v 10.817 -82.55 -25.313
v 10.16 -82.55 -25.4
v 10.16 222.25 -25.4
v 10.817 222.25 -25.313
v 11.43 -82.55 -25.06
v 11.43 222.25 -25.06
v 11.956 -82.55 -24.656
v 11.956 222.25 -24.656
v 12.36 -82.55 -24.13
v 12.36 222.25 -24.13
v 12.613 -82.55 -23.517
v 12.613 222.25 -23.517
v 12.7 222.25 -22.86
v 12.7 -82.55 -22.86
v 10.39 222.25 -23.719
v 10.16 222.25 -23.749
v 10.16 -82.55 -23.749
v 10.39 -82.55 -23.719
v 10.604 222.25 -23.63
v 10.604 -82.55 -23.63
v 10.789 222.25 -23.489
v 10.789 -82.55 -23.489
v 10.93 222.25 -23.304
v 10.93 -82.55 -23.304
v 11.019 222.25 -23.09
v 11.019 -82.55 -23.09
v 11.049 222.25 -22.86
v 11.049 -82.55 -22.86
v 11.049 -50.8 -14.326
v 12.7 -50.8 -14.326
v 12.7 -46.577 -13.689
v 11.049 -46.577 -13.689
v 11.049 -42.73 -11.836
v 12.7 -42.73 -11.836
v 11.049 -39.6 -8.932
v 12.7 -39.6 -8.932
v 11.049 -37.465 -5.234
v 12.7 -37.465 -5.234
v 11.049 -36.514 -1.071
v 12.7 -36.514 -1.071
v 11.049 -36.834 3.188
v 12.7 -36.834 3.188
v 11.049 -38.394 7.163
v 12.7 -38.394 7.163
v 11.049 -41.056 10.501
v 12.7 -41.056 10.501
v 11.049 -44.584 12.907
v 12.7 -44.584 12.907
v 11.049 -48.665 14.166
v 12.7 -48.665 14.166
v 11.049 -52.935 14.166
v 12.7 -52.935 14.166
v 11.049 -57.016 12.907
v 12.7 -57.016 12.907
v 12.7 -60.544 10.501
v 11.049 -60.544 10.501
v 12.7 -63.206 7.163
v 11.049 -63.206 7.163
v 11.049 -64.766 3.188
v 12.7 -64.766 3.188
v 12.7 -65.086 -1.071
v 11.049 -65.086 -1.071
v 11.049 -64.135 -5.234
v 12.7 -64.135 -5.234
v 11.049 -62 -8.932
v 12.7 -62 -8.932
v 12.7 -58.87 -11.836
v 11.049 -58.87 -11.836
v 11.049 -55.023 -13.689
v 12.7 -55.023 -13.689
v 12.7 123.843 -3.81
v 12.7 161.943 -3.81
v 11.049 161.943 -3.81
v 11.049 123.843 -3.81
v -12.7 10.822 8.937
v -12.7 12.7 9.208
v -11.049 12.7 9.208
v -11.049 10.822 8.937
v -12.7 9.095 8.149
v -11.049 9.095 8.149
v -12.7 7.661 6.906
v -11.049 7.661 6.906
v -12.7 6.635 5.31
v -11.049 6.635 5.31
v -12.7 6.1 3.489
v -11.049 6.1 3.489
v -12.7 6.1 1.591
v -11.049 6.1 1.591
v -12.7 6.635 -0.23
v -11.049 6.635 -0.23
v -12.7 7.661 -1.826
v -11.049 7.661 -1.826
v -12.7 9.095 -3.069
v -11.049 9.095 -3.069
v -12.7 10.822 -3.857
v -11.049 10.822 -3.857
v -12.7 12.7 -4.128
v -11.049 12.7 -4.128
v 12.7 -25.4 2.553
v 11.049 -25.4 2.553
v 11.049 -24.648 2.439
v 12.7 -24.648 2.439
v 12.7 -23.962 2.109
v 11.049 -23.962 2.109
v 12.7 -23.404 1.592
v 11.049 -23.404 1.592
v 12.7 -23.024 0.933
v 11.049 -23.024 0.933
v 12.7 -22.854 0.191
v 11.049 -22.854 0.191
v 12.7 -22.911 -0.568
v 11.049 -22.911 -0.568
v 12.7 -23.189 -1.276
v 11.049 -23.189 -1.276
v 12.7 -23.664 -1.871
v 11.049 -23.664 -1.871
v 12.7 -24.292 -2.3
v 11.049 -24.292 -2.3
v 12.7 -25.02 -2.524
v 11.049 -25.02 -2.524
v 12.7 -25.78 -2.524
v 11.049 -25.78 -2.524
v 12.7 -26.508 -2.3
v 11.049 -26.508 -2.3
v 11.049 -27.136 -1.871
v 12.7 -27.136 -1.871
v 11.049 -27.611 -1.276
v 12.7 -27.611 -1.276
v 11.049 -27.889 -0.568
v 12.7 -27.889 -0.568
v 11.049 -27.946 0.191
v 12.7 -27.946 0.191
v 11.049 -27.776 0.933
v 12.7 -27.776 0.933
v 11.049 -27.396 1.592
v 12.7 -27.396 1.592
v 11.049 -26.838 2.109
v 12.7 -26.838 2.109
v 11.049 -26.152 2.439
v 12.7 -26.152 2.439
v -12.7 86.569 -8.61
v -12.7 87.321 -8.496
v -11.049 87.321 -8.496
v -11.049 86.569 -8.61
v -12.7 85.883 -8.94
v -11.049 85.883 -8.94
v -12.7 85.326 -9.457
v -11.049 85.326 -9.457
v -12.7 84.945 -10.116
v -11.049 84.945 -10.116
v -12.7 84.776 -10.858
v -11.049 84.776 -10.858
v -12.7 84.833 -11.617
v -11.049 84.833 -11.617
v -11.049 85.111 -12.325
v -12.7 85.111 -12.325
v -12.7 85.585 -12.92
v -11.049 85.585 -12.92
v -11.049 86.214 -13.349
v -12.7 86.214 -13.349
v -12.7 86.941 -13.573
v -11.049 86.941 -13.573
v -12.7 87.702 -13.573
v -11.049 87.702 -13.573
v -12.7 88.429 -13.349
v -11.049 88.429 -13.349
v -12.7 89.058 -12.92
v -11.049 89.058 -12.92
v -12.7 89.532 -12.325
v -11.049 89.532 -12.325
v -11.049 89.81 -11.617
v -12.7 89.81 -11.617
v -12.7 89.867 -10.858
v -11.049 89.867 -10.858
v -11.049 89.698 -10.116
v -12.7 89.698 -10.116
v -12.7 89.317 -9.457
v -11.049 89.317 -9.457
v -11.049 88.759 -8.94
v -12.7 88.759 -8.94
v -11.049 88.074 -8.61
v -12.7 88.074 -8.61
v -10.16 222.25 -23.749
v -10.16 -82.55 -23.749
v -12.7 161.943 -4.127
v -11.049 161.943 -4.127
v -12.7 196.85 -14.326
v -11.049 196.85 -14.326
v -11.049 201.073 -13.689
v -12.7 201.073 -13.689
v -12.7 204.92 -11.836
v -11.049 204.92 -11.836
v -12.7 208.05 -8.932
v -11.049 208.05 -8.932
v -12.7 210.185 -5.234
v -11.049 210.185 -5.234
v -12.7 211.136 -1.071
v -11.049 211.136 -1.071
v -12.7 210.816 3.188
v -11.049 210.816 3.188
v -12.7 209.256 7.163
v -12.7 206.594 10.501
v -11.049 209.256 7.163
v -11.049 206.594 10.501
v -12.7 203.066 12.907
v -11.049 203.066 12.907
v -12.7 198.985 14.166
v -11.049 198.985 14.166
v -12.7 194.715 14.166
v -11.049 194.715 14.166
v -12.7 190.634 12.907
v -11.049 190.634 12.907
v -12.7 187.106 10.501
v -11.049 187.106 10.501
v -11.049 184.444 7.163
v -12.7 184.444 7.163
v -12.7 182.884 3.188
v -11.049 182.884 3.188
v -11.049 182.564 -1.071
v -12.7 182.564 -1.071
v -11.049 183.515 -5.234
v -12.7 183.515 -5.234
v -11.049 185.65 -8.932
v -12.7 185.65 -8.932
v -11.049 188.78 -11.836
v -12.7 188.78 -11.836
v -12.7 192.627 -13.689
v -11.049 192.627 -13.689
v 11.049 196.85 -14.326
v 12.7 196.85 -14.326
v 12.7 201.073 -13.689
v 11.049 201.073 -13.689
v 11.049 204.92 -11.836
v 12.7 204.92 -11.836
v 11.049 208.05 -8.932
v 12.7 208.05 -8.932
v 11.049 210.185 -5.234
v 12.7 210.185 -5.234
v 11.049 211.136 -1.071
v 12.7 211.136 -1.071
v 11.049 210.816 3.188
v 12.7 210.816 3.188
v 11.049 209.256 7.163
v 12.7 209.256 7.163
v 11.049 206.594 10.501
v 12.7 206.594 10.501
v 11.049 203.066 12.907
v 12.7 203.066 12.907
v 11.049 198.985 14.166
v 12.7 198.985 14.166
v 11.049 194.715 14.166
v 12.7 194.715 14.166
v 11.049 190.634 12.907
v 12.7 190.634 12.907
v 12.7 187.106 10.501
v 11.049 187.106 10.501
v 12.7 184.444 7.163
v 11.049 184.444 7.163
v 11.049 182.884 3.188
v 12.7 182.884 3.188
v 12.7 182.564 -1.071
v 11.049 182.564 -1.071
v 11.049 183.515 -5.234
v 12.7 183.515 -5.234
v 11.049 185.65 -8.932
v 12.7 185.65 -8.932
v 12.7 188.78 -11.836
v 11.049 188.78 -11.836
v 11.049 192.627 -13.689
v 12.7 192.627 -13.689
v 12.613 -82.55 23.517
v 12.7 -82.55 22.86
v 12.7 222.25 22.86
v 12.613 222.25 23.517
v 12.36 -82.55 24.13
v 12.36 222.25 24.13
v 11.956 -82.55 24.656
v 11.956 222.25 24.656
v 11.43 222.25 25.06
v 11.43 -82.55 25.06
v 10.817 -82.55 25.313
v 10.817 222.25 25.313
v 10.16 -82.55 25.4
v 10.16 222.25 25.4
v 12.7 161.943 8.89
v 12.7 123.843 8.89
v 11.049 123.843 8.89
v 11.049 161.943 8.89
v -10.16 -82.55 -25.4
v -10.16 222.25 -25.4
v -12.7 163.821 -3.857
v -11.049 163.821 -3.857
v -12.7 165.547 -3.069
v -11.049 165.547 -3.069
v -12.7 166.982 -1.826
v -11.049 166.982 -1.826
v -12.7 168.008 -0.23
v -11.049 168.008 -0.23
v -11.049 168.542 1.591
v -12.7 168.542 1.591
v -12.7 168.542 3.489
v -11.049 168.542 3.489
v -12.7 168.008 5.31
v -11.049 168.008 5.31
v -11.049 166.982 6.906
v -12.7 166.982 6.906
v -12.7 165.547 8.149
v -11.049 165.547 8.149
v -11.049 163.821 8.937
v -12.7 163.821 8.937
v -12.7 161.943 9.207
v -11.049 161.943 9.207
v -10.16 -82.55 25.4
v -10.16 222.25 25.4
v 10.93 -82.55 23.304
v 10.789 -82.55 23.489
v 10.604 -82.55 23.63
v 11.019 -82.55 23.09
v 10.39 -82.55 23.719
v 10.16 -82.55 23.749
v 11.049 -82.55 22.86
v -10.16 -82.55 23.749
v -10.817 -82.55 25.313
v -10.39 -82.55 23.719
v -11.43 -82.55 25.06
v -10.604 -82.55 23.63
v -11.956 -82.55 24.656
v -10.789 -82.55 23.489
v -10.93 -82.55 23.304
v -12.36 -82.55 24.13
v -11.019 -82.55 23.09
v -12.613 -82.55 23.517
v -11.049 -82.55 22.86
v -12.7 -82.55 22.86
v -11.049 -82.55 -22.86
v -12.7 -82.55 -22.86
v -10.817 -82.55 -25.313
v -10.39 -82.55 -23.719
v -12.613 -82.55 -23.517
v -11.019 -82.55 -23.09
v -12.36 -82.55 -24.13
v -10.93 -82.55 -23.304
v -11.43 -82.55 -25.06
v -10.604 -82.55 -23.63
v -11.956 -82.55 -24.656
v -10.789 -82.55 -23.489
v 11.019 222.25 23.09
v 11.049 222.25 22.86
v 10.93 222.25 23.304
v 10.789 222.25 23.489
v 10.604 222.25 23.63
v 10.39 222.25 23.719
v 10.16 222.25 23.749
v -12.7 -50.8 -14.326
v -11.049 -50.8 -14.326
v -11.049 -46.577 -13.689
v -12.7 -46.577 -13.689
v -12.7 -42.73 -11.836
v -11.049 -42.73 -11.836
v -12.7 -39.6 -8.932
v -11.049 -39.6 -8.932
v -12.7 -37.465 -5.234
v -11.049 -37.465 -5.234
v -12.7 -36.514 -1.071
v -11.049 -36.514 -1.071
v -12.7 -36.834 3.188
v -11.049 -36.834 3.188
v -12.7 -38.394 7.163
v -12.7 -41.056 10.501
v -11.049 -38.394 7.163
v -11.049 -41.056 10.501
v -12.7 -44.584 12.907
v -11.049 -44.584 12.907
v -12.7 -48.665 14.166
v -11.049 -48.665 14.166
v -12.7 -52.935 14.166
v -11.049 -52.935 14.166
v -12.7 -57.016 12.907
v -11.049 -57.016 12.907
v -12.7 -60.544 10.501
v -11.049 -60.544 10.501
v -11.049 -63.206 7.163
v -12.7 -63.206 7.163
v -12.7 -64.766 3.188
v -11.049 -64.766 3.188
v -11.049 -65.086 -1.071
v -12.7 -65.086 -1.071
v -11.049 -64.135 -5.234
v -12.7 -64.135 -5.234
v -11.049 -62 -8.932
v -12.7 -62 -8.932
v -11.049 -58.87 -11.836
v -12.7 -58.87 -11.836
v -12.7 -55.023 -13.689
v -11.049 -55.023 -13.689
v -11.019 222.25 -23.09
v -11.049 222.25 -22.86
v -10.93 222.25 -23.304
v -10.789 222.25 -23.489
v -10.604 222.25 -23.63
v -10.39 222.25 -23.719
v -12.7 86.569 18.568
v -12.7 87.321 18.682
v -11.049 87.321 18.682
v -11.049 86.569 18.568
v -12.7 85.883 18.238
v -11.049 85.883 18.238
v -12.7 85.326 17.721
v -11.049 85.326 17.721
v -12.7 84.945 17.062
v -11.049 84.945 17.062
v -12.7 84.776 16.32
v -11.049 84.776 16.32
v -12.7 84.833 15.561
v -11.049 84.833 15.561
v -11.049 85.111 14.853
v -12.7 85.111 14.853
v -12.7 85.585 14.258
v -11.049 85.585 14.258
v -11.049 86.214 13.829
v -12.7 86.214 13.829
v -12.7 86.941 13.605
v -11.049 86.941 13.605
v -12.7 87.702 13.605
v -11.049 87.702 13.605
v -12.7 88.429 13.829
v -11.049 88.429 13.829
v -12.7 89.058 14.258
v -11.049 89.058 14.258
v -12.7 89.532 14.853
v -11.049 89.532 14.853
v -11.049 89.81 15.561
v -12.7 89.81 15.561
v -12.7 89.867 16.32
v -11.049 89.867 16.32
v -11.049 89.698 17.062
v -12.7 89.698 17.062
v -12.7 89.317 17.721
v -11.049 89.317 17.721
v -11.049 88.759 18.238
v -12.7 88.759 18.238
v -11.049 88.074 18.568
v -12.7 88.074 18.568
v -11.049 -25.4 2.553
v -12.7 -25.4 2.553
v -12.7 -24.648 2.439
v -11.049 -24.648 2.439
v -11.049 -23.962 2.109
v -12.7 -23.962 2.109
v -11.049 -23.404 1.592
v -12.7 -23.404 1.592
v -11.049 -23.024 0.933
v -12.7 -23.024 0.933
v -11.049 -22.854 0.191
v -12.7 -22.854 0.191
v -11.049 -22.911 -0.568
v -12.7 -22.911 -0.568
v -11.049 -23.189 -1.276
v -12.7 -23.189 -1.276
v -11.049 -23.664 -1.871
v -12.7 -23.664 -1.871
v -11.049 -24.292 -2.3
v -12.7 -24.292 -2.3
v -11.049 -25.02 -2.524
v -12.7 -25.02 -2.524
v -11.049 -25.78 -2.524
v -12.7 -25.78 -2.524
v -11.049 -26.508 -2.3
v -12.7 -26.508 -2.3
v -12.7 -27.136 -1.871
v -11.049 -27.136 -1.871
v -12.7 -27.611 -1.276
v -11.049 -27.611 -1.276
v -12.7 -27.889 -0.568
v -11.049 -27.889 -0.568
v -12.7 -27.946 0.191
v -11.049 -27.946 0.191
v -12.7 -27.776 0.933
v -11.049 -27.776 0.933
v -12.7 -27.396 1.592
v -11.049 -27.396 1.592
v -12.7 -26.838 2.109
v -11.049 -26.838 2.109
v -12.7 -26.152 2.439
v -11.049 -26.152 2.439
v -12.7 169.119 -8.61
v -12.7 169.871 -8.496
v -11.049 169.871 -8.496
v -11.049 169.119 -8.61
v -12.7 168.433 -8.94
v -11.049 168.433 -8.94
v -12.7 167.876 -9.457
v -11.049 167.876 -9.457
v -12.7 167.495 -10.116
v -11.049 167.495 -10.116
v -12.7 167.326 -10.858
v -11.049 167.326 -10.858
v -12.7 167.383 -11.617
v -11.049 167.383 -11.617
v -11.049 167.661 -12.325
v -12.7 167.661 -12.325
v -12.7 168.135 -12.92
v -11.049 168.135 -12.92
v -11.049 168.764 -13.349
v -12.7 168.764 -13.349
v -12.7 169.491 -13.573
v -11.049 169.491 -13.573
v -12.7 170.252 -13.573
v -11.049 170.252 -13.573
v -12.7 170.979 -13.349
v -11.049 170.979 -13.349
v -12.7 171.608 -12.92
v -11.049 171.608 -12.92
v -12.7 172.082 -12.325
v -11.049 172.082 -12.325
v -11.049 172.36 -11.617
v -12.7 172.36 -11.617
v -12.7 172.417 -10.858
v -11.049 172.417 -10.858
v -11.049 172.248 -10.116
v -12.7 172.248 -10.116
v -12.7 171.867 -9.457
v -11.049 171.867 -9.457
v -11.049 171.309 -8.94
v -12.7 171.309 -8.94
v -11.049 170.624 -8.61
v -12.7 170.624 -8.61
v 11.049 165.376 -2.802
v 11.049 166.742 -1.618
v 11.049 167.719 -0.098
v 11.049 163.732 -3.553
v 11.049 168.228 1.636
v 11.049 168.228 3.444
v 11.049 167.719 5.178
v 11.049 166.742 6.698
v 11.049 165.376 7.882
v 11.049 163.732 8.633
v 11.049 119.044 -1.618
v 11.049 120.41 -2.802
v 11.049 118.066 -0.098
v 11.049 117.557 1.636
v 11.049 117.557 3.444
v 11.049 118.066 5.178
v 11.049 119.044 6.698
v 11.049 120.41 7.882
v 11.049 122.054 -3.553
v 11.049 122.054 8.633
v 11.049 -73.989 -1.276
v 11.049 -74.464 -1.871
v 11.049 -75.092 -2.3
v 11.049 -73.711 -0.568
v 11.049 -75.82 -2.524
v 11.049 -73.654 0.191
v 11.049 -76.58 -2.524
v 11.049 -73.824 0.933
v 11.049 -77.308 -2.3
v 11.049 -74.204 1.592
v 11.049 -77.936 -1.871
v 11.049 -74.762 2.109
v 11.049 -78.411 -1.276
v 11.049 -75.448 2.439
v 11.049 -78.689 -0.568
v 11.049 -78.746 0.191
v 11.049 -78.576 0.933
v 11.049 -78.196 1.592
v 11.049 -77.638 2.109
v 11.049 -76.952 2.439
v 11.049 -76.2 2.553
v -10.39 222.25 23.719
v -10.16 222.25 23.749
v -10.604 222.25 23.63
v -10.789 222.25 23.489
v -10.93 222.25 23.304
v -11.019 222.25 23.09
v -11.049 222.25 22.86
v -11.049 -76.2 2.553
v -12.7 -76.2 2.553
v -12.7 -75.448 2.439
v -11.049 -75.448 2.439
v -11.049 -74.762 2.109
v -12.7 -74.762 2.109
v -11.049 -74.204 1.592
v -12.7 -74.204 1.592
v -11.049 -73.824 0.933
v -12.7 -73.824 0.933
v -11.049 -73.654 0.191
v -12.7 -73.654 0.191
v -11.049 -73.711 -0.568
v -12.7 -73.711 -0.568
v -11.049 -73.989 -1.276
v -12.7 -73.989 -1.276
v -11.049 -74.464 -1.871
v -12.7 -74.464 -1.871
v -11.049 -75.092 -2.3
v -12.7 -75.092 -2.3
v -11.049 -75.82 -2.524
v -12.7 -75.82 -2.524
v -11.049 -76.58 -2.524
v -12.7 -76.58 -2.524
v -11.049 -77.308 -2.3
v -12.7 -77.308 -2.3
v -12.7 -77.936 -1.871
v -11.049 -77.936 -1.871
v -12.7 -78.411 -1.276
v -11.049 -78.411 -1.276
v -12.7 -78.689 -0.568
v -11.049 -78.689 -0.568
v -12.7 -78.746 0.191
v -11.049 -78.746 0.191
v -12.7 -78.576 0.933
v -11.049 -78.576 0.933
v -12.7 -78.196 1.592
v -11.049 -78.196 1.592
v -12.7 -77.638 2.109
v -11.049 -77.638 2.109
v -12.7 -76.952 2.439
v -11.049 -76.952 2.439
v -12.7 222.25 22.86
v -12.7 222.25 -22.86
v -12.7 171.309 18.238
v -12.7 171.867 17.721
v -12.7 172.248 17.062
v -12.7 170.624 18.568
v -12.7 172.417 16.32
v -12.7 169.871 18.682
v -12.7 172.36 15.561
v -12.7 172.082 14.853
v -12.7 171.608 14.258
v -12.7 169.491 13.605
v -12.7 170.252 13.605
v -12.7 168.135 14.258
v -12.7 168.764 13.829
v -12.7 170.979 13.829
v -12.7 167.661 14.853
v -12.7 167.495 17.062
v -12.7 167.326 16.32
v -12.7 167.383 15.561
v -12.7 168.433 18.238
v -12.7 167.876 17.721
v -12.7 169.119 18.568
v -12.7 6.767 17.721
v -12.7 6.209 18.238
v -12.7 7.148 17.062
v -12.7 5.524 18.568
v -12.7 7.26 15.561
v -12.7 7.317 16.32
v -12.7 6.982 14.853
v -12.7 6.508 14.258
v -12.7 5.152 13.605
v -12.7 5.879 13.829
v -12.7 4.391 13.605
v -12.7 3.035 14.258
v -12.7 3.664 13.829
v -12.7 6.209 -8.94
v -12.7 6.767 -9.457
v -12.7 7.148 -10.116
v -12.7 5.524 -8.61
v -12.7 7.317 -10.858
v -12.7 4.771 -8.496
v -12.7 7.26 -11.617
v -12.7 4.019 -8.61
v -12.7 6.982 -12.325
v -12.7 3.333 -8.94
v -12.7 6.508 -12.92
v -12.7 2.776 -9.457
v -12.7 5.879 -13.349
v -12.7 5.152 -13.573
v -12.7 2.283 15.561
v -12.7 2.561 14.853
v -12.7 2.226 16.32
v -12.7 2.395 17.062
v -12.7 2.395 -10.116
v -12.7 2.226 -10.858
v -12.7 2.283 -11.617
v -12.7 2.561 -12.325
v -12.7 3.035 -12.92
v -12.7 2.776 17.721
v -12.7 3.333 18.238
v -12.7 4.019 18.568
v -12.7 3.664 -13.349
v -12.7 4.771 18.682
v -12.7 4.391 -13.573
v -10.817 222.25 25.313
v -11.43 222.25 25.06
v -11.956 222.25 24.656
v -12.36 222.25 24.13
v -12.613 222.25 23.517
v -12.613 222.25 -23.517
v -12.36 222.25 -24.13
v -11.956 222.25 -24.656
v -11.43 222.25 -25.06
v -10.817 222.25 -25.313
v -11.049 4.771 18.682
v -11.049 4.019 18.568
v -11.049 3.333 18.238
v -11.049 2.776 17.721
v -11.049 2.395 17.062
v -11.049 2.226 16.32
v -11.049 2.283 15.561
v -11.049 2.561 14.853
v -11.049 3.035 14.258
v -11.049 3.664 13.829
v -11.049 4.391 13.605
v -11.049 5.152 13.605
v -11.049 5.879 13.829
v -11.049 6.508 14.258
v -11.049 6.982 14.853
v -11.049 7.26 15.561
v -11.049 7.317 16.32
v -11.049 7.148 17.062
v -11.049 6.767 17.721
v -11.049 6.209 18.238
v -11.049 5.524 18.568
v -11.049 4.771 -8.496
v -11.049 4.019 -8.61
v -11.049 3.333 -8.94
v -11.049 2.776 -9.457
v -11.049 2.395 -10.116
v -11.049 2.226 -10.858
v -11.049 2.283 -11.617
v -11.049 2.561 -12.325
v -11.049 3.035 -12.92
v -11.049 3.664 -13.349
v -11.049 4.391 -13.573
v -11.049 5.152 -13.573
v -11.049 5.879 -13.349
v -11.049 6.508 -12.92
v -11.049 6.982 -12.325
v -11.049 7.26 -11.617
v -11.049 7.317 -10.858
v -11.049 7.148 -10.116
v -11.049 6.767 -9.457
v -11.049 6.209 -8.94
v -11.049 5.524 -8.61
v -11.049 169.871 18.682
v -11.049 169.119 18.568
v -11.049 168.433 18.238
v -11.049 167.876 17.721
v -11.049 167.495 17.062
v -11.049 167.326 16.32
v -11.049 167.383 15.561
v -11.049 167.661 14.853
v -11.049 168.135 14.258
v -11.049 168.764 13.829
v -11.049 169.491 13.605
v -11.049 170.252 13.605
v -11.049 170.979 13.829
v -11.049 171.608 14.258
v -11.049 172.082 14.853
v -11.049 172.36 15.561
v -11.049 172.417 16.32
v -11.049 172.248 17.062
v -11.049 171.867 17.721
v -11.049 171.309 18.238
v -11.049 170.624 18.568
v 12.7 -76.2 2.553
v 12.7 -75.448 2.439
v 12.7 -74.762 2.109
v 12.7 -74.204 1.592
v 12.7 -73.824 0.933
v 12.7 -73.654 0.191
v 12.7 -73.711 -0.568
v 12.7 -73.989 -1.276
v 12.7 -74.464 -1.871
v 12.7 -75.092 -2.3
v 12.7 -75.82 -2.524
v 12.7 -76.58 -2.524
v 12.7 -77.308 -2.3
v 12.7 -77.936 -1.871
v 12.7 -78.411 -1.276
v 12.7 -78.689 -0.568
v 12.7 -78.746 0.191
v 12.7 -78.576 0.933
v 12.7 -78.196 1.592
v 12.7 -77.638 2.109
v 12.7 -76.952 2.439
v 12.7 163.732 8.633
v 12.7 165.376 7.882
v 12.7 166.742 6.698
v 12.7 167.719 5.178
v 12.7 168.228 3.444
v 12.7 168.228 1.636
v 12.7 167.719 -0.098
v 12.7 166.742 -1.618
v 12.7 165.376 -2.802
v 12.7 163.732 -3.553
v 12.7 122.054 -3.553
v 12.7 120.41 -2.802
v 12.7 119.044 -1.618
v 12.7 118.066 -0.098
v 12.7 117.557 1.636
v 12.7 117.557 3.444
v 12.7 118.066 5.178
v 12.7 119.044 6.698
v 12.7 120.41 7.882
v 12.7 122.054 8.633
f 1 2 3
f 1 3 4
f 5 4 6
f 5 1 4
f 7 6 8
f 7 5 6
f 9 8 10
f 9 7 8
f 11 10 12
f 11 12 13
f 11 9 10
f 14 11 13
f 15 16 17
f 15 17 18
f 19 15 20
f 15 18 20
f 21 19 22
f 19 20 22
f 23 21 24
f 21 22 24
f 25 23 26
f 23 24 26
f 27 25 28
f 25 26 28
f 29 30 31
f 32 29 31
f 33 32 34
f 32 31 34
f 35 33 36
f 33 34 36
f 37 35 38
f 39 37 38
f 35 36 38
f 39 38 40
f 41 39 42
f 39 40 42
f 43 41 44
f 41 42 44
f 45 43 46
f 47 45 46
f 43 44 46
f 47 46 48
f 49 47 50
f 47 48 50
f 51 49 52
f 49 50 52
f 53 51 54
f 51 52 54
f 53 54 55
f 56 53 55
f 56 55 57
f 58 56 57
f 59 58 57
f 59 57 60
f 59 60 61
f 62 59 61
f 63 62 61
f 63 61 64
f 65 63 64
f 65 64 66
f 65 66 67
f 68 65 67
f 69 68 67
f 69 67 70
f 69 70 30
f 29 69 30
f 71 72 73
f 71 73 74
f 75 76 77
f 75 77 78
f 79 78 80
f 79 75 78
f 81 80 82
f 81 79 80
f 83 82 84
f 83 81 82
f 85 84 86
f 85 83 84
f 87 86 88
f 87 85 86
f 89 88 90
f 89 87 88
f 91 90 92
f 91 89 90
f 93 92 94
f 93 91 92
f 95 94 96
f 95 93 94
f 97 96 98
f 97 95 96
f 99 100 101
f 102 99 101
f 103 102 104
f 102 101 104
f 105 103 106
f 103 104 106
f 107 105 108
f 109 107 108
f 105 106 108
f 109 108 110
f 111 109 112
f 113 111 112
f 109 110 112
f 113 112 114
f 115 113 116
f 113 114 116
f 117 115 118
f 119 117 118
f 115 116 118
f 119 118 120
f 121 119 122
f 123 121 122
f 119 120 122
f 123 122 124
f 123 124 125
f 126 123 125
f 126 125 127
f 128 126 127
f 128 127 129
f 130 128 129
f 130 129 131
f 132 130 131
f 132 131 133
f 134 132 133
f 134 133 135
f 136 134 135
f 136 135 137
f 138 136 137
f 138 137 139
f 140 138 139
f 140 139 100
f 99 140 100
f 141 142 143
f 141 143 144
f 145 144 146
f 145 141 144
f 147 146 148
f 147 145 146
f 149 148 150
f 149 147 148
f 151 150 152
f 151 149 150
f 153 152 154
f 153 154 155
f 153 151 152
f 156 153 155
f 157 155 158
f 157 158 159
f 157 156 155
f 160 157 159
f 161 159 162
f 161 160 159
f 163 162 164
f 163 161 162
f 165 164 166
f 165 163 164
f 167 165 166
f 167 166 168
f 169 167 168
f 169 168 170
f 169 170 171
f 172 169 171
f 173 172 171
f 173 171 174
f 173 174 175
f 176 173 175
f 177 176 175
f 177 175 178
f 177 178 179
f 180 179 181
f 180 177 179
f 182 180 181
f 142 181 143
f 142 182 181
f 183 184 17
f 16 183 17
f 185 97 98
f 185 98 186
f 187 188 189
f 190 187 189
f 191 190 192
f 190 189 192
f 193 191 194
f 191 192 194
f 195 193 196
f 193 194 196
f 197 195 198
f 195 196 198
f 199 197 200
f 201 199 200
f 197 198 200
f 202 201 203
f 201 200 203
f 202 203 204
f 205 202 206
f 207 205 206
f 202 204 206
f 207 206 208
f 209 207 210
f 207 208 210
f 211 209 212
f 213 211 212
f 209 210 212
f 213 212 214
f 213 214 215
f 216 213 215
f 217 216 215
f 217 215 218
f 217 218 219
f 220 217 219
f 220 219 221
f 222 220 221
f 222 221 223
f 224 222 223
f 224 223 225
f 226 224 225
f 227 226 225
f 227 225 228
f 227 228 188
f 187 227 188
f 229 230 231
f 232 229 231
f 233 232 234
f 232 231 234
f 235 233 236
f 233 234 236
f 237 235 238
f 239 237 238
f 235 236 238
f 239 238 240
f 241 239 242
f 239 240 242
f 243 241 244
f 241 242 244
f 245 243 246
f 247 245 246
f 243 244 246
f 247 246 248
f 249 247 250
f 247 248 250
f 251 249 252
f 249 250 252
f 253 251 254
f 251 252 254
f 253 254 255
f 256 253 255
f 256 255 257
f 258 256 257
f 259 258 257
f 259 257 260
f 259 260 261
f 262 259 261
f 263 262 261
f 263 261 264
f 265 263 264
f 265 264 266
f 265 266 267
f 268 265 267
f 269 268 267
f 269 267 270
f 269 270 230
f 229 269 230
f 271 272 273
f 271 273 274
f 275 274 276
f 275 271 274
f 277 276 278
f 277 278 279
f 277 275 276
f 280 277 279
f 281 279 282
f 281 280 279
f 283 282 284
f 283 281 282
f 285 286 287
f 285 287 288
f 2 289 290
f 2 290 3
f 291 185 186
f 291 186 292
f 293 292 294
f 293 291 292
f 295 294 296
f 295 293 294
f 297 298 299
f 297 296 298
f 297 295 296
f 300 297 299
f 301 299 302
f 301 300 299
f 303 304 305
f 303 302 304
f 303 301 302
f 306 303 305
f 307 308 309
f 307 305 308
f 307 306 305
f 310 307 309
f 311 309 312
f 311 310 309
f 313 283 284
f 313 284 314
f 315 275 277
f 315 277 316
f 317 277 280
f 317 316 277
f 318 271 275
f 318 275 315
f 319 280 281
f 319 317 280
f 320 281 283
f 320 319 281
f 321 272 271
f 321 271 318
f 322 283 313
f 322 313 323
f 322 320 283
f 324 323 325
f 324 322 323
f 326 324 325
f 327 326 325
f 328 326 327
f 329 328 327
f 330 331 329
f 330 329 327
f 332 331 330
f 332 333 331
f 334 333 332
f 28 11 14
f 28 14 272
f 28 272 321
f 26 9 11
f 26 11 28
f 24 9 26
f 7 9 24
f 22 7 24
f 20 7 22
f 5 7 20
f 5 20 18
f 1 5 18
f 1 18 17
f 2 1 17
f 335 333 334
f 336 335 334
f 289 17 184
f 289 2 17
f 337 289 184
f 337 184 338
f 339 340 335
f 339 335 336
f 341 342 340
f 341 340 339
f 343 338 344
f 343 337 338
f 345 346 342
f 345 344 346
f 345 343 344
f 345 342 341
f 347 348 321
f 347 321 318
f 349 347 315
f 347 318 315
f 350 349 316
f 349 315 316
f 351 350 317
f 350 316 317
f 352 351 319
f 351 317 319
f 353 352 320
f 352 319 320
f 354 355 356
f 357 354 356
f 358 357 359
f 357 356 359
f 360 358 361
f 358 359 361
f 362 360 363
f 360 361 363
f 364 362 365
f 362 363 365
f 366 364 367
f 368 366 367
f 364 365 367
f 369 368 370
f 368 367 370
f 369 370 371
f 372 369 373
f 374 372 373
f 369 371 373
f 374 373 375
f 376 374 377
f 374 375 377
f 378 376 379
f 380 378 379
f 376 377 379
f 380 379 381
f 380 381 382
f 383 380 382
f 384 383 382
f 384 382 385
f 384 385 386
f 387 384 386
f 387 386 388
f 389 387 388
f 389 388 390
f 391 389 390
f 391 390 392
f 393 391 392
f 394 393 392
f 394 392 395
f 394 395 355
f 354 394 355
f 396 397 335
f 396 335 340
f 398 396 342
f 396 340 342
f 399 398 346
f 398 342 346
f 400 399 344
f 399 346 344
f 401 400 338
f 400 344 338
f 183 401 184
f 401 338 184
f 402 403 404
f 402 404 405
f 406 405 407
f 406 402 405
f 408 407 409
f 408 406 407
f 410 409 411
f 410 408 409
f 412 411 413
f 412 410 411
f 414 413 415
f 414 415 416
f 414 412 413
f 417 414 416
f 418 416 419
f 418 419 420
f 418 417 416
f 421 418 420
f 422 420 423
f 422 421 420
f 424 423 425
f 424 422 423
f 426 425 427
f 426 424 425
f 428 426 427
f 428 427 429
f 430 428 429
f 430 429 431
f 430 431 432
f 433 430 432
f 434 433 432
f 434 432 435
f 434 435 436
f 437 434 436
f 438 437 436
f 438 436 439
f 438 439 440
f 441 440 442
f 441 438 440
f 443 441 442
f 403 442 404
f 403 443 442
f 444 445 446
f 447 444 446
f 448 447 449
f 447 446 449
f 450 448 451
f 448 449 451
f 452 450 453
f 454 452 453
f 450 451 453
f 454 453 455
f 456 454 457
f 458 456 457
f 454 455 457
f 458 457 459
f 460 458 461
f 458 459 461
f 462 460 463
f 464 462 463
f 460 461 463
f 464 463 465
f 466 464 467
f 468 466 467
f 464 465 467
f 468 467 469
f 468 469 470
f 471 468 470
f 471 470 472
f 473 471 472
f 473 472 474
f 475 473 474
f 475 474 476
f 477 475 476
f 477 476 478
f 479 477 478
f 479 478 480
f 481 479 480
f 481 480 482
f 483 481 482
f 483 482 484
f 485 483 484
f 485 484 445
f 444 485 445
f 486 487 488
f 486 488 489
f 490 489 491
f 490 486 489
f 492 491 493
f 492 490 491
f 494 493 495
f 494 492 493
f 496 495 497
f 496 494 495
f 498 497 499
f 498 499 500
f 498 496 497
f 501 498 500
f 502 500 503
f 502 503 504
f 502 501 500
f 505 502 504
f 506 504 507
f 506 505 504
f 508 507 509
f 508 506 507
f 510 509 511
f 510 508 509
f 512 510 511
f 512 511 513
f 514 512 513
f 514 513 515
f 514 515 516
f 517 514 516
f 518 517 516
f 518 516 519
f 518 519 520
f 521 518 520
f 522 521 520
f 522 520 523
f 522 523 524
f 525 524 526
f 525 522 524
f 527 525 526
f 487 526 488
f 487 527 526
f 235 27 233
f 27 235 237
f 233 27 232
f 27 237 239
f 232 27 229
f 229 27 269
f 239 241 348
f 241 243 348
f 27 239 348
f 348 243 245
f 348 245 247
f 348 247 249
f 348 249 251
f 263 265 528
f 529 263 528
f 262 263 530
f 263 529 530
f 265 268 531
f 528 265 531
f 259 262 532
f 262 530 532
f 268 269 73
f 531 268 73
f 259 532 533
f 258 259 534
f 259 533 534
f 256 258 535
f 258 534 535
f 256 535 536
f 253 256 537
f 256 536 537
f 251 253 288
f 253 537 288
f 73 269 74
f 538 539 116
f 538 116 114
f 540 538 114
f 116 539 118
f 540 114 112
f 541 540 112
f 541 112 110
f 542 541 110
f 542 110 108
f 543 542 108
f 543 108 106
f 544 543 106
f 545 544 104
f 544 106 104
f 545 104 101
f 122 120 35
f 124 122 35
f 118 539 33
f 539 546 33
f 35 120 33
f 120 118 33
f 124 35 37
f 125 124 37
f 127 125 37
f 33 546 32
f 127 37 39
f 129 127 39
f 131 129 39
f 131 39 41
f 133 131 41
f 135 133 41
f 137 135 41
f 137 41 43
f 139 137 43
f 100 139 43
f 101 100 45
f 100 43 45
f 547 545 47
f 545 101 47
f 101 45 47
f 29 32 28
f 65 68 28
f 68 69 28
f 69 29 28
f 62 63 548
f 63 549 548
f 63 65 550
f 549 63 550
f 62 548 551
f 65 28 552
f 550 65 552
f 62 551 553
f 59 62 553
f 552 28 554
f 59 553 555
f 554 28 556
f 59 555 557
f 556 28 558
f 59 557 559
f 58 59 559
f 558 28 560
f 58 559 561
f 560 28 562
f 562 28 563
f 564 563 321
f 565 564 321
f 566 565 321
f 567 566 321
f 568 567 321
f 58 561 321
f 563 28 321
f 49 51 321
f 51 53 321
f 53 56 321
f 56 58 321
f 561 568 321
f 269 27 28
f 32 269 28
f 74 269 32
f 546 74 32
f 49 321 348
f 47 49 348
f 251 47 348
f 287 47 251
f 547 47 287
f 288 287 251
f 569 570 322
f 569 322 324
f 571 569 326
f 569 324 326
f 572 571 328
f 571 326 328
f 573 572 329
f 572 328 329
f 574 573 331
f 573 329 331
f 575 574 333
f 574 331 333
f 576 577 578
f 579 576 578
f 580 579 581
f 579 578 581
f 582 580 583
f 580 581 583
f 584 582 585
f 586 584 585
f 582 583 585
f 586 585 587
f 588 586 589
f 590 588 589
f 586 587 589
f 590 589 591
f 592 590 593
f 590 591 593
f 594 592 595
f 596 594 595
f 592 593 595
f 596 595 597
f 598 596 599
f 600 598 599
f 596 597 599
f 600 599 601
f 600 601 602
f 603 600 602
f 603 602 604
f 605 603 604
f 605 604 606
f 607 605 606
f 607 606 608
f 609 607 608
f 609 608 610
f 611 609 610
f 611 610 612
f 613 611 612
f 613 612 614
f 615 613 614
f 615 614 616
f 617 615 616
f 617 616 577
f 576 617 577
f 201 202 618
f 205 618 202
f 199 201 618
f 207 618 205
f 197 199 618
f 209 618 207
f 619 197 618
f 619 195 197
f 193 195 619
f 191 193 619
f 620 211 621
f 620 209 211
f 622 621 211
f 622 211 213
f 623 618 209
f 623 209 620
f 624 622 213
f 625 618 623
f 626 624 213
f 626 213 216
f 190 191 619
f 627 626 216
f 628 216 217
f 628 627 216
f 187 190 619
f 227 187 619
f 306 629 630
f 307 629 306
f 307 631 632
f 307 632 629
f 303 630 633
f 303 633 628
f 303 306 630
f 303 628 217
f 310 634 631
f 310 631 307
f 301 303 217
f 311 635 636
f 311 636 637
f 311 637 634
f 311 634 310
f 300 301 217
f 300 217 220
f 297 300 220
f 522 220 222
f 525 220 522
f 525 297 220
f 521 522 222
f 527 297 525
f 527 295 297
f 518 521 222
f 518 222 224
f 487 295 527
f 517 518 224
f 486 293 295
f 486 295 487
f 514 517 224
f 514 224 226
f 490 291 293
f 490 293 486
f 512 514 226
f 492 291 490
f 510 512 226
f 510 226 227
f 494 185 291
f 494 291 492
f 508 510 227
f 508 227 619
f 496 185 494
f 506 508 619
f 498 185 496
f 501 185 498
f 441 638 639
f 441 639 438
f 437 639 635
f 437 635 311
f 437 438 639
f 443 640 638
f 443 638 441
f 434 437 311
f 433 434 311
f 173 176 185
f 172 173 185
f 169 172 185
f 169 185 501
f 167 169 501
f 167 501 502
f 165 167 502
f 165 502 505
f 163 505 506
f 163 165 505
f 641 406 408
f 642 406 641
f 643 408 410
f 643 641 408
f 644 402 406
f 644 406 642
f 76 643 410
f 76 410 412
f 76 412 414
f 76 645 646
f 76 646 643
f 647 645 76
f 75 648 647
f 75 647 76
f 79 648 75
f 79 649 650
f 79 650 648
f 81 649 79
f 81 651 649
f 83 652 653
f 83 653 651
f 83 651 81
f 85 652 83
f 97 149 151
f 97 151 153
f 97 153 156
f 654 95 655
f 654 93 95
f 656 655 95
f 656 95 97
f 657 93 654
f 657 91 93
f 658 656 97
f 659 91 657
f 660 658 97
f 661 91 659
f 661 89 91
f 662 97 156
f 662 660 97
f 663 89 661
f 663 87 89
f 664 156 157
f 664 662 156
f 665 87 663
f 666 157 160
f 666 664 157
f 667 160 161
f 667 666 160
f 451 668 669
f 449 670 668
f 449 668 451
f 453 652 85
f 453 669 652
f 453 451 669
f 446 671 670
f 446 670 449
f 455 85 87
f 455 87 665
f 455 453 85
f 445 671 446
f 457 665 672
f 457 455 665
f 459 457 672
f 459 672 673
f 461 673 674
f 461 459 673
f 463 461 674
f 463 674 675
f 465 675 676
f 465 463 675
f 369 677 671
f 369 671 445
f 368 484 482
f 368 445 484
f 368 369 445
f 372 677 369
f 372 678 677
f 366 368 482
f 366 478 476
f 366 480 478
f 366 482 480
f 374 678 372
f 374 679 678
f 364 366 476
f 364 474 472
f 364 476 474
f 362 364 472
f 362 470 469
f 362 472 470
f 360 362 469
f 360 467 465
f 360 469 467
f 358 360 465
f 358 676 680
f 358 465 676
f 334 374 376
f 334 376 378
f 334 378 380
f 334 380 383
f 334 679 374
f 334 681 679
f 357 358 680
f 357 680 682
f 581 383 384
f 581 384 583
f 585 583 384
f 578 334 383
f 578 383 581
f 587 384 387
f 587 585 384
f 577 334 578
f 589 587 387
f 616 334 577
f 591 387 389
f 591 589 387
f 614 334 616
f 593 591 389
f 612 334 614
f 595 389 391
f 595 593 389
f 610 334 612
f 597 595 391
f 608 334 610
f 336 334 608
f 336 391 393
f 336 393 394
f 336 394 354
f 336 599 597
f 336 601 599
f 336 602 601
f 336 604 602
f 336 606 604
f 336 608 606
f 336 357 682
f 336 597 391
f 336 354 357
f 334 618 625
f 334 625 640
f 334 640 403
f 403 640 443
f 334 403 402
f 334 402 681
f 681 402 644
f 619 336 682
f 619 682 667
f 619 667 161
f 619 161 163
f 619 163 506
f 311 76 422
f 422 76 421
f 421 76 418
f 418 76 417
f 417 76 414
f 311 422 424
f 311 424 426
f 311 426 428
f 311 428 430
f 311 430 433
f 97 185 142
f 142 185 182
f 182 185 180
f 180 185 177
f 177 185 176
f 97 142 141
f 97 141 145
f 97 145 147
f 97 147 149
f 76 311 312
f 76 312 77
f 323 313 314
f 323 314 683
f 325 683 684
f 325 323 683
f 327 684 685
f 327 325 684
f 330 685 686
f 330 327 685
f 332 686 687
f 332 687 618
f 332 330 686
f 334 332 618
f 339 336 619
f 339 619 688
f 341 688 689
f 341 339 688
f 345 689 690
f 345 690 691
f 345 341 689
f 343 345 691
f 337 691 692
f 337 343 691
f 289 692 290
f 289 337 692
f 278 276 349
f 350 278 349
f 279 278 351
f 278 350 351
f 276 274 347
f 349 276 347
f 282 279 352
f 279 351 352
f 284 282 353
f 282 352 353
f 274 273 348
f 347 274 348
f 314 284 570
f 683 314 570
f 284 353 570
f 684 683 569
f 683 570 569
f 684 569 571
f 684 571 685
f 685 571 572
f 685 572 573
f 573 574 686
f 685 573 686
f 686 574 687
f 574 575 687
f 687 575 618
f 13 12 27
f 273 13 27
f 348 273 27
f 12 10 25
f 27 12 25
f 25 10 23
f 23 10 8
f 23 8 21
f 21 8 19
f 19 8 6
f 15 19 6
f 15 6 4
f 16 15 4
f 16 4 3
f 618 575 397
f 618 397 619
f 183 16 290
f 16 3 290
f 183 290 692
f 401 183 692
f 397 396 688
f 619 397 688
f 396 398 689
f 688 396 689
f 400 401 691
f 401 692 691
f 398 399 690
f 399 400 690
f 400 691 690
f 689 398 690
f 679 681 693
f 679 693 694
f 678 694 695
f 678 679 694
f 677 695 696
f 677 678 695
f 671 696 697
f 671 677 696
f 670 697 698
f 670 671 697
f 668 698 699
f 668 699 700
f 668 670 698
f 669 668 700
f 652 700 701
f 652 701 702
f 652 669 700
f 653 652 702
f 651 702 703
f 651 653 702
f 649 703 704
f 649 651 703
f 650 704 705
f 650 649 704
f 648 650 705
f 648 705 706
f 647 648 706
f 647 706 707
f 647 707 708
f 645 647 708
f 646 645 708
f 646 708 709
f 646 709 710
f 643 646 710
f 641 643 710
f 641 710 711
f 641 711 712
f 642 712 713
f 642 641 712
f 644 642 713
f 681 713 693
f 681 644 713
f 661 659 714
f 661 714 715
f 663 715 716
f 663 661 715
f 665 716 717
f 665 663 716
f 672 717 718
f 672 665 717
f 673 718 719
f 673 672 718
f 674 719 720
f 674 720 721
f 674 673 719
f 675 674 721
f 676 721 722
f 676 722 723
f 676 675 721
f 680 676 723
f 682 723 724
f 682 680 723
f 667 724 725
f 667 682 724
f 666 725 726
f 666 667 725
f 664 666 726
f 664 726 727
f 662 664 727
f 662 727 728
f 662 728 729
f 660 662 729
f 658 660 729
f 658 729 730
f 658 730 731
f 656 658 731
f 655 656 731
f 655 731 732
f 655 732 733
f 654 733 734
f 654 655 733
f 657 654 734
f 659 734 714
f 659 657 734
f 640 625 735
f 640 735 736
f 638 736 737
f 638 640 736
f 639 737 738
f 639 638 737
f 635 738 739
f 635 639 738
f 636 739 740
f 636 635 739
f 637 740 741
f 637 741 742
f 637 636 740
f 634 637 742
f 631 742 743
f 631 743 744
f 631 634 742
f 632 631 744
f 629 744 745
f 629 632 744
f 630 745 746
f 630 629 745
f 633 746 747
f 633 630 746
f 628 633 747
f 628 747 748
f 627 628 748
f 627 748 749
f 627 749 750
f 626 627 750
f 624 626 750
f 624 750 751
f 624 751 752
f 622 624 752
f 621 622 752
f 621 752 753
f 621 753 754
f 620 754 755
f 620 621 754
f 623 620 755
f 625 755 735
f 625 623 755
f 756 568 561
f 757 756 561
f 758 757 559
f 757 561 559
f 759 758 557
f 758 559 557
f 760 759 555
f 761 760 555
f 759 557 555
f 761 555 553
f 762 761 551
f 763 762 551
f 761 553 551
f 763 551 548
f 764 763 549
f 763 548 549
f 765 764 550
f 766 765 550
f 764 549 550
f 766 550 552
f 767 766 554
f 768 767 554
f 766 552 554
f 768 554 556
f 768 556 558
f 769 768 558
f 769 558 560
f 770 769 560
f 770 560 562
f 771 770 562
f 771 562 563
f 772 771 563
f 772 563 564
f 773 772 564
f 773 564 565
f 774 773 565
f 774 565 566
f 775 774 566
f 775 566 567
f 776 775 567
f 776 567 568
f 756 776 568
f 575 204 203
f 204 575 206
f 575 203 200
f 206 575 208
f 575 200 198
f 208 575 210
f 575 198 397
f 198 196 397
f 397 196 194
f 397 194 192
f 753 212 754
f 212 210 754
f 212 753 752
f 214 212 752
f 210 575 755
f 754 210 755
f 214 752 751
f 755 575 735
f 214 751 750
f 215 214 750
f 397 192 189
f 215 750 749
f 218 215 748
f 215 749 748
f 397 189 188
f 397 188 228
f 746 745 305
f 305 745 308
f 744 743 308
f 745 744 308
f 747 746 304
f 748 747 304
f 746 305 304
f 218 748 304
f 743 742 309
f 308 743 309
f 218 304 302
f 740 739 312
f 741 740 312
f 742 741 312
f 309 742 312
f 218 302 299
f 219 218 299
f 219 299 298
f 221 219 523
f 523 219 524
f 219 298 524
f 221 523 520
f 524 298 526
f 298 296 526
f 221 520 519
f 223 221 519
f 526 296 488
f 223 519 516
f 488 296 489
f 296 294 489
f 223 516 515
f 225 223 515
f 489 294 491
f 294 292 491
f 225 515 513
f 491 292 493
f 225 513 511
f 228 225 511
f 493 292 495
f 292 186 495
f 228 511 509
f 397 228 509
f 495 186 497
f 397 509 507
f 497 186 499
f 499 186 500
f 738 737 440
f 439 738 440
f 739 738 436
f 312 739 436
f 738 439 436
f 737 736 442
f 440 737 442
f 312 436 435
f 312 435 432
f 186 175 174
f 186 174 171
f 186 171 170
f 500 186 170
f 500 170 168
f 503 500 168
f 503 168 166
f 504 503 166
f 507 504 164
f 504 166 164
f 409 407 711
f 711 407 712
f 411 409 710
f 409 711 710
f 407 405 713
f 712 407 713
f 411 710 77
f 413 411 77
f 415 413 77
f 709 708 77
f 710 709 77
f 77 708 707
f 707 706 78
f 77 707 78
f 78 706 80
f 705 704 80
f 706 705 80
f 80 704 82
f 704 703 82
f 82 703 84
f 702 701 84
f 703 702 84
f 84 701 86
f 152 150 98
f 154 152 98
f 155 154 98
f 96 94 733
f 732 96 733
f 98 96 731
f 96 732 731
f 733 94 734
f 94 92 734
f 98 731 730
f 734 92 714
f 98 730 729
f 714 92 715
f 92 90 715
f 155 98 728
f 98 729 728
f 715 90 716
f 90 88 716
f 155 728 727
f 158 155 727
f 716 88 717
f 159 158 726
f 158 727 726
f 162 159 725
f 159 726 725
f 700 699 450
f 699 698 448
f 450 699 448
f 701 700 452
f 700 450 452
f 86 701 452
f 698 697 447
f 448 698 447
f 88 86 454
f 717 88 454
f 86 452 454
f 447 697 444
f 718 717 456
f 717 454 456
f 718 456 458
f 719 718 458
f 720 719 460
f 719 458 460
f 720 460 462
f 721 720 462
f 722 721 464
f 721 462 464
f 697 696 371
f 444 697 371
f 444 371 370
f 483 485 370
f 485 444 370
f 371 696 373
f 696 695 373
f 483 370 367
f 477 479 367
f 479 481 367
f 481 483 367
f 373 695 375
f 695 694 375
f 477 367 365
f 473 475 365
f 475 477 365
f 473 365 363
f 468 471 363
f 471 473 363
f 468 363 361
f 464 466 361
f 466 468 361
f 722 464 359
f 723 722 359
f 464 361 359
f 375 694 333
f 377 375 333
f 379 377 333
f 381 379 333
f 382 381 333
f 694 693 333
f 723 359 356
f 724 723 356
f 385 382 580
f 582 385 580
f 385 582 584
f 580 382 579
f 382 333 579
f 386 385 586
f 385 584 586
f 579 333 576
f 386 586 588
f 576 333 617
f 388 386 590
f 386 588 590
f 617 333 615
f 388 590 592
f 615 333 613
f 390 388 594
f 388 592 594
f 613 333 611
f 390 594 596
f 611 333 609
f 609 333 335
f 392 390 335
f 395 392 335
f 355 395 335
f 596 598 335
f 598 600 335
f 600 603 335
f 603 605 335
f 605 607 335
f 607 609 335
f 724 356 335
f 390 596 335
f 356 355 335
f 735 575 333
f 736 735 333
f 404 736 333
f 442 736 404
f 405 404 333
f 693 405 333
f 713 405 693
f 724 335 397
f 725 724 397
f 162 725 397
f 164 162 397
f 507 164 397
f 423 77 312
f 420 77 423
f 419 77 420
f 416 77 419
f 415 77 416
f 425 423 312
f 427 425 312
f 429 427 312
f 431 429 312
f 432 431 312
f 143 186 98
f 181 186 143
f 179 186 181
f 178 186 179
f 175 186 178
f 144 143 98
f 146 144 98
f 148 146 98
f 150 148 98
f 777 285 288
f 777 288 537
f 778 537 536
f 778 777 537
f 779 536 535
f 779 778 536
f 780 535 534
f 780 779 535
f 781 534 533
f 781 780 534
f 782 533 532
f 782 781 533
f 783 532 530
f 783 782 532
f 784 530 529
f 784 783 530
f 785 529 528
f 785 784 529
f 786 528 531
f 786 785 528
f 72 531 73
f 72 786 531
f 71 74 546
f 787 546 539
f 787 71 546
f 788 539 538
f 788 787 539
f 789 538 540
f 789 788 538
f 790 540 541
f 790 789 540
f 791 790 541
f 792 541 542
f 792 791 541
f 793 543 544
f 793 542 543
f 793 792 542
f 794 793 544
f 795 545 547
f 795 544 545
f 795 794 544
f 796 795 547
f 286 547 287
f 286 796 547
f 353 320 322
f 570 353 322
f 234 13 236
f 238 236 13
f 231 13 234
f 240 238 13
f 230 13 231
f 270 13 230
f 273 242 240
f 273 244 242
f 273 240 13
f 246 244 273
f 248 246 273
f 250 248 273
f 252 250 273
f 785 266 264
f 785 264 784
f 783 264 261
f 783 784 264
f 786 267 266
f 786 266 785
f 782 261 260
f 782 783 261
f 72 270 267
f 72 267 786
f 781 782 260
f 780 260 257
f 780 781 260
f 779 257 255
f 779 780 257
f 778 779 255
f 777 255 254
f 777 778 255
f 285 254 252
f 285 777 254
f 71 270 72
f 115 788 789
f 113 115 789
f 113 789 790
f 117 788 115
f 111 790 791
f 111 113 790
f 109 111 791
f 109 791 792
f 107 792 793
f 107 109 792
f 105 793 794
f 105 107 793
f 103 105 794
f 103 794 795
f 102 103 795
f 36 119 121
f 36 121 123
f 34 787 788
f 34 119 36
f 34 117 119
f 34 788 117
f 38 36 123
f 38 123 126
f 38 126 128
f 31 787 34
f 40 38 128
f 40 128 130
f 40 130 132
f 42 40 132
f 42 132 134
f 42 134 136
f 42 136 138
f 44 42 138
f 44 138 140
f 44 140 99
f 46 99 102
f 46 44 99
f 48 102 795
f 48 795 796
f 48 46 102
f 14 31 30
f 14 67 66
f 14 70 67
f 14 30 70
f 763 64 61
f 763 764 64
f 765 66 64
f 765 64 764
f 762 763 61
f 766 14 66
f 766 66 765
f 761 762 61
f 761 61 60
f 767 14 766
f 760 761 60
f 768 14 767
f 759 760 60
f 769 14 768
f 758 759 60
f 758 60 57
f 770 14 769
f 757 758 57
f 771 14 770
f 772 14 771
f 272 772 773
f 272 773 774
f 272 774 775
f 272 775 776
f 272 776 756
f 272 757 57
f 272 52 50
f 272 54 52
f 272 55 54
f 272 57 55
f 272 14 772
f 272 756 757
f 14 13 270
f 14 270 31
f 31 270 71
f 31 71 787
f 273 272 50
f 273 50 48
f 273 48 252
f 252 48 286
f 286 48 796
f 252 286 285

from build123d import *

# Parameters (mm, degrees)
EXTRUDE_THIN1_DEPTH      = 222.25
EXTRUDE_THIN1_DEPTH_BACK = 82.55
CUT_EXTRUDE1_REACH       = 227.134
CUT_EXTRUDE4_REACH       = 227.134
SKETCH4_R                = 2.5527
CUT_EXTRUDE3_DEPTH       = 1.651
SKETCH6_R                = 14.3256
CUT_EXTRUDE5_DEPTH       = 226.134143346
F_10_CLEARANCE_HOLE1_D   = 5.1054


with BuildPart() as part:
    # Sketch1 → Extrude-Thin1 (new, two sides: drawn at the far end of the back side and taken through both)
    with BuildSketch(Plane(origin=(0, 0, 0), x_dir=(1, 0, 0), z_dir=(0, 1, 0)).offset(-EXTRUDE_THIN1_DEPTH_BACK)):
        with BuildLine():
            Line((-10.16, 25.4), (10.16, 25.4))
            ThreePointArc((10.16, 25.4), (11.956051224, 24.656051224), (12.7, 22.86))
            Line((12.7, 22.86), (12.7, -22.86))
            ThreePointArc((12.7, -22.86), (11.956051224, -24.656051224), (10.16, -25.4))
            Line((10.16, -25.4), (-10.16, -25.4))
            ThreePointArc((-10.16, -25.4), (-11.956051224, -24.656051224), (-12.7, -22.86))
            Line((-12.7, -22.86), (-12.7, 22.86))
            ThreePointArc((-12.7, 22.86), (-11.956051224, 24.656051224), (-10.16, 25.4))
        make_face()
        with BuildLine():
            Line((-10.16, 23.749), (10.16, 23.749))
            ThreePointArc((10.16, 23.749), (10.788617928, 23.488617928), (11.049, 22.86))
            Line((11.049, 22.86), (11.049, -22.86))
            ThreePointArc((11.049, -22.86), (10.788617928, -23.488617928), (10.16, -23.749))
            Line((10.16, -23.749), (-10.16, -23.749))
            ThreePointArc((-10.16, -23.749), (-10.788617928, -23.488617928), (-11.049, -22.86))
            Line((-11.049, -22.86), (-11.049, 22.86))
            ThreePointArc((-11.049, 22.86), (-10.788617928, 23.488617928), (-10.16, 23.749))
        make_face(mode=Mode.SUBTRACT)
    extrude(amount=EXTRUDE_THIN1_DEPTH + EXTRUDE_THIN1_DEPTH_BACK)

    # Sketch2 → Cut-Extrude1 (cut, up to next)
    with BuildSketch(Plane.ZY.offset(12.7), mode=Mode.PRIVATE) as cut_extrude1_sk1:
        with BuildLine():
            Line((9.2075, 161.942613489), (9.2075, 12.7))
            ThreePointArc((9.2075, 12.7), (2.54, 6.0325), (-4.1275, 12.7))
            Line((-4.1275, 12.7), (-4.1275, 161.942613489))
            ThreePointArc((-4.1275, 161.942613489), (2.54, 168.610113489), (9.2075, 161.942613489))
        make_face()
    cut_extrude1_tool1 = extrude(cut_extrude1_sk1.sketch, amount=-CUT_EXTRUDE1_REACH, mode=Mode.PRIVATE) & part.part
    add(cut_extrude1_tool1.solids().sort_by_distance((-12.7, 87.321307, 2.54))[0], mode=Mode.SUBTRACT)

    # Sketch5 → Cut-Extrude4 (cut, up to next)
    with BuildSketch(Plane(origin=(12.7, 0, 0), x_dir=(0, 0, -1), z_dir=(1, 0, 0)), mode=Mode.PRIVATE) as cut_extrude4_sk1:
        with BuildLine():
            Line((3.81, 161.942613489), (3.81, 123.842613489))
            ThreePointArc((3.81, 123.842613489), (-2.54, 117.492613489), (-8.89, 123.842613489))
            Line((-8.89, 123.842613489), (-8.89, 161.942613489))
            ThreePointArc((-8.89, 161.942613489), (-2.54, 168.292613489), (3.81, 161.942613489))
        make_face()
    cut_extrude4_tool1 = extrude(cut_extrude4_sk1.sketch, amount=-CUT_EXTRUDE4_REACH, mode=Mode.PRIVATE) & part.part
    add(cut_extrude4_tool1.solids().sort_by_distance((12.7, 142.892613, 2.54))[0], mode=Mode.SUBTRACT)

    # Sketch4 → Cut-Extrude3 (cut)
    with BuildSketch(Plane(origin=(-12.7, 0, 0), x_dir=(0, 0, -1), z_dir=(1, 0, 0))):
        with Locations(Location((11.049, 4.771306688, 0), (0, 0, 180))):
            Circle(SKETCH4_R)
        with Locations(Location((-16.129, 4.771306688, 0), (0, 0, 180))):
            Circle(SKETCH4_R)
        with Locations(Location((-16.129, 87.321306688, 0), (0, 0, 180))):
            Circle(SKETCH4_R)
        with Locations(Location((11.049, 87.321306688, 0), (0, 0, 180))):
            Circle(SKETCH4_R)
        with Locations(Location((-16.129, 169.871306688, 0), (0, 0, 180))):
            Circle(SKETCH4_R)
        with Locations(Location((11.049, 169.871306688, 0), (0, 0, 180))):
            Circle(SKETCH4_R)
    extrude(amount=CUT_EXTRUDE3_DEPTH, mode=Mode.SUBTRACT)

    # Sketch6 → Cut-Extrude5 (cut, through all)
    with BuildSketch(Plane(origin=(12.7, 0, 0), x_dir=(0, 0, -1), z_dir=(1, 0, 0))):
        with Locations((0, -50.8)):
            Circle(SKETCH6_R)
        with Locations((0, 196.85)):
            Circle(SKETCH6_R)
    extrude(amount=-CUT_EXTRUDE5_DEPTH, mode=Mode.SUBTRACT)

    # #10 Clearance Hole1 (through all)
    with Locations(Plane(origin=(12.7, 0, 0), x_dir=(0, 0, -1), z_dir=(1, 0, 0))):
        with Locations((0, -25.4), (0, -76.2)):
            Hole(F_10_CLEARANCE_HOLE1_D / 2)


solid = part.part
